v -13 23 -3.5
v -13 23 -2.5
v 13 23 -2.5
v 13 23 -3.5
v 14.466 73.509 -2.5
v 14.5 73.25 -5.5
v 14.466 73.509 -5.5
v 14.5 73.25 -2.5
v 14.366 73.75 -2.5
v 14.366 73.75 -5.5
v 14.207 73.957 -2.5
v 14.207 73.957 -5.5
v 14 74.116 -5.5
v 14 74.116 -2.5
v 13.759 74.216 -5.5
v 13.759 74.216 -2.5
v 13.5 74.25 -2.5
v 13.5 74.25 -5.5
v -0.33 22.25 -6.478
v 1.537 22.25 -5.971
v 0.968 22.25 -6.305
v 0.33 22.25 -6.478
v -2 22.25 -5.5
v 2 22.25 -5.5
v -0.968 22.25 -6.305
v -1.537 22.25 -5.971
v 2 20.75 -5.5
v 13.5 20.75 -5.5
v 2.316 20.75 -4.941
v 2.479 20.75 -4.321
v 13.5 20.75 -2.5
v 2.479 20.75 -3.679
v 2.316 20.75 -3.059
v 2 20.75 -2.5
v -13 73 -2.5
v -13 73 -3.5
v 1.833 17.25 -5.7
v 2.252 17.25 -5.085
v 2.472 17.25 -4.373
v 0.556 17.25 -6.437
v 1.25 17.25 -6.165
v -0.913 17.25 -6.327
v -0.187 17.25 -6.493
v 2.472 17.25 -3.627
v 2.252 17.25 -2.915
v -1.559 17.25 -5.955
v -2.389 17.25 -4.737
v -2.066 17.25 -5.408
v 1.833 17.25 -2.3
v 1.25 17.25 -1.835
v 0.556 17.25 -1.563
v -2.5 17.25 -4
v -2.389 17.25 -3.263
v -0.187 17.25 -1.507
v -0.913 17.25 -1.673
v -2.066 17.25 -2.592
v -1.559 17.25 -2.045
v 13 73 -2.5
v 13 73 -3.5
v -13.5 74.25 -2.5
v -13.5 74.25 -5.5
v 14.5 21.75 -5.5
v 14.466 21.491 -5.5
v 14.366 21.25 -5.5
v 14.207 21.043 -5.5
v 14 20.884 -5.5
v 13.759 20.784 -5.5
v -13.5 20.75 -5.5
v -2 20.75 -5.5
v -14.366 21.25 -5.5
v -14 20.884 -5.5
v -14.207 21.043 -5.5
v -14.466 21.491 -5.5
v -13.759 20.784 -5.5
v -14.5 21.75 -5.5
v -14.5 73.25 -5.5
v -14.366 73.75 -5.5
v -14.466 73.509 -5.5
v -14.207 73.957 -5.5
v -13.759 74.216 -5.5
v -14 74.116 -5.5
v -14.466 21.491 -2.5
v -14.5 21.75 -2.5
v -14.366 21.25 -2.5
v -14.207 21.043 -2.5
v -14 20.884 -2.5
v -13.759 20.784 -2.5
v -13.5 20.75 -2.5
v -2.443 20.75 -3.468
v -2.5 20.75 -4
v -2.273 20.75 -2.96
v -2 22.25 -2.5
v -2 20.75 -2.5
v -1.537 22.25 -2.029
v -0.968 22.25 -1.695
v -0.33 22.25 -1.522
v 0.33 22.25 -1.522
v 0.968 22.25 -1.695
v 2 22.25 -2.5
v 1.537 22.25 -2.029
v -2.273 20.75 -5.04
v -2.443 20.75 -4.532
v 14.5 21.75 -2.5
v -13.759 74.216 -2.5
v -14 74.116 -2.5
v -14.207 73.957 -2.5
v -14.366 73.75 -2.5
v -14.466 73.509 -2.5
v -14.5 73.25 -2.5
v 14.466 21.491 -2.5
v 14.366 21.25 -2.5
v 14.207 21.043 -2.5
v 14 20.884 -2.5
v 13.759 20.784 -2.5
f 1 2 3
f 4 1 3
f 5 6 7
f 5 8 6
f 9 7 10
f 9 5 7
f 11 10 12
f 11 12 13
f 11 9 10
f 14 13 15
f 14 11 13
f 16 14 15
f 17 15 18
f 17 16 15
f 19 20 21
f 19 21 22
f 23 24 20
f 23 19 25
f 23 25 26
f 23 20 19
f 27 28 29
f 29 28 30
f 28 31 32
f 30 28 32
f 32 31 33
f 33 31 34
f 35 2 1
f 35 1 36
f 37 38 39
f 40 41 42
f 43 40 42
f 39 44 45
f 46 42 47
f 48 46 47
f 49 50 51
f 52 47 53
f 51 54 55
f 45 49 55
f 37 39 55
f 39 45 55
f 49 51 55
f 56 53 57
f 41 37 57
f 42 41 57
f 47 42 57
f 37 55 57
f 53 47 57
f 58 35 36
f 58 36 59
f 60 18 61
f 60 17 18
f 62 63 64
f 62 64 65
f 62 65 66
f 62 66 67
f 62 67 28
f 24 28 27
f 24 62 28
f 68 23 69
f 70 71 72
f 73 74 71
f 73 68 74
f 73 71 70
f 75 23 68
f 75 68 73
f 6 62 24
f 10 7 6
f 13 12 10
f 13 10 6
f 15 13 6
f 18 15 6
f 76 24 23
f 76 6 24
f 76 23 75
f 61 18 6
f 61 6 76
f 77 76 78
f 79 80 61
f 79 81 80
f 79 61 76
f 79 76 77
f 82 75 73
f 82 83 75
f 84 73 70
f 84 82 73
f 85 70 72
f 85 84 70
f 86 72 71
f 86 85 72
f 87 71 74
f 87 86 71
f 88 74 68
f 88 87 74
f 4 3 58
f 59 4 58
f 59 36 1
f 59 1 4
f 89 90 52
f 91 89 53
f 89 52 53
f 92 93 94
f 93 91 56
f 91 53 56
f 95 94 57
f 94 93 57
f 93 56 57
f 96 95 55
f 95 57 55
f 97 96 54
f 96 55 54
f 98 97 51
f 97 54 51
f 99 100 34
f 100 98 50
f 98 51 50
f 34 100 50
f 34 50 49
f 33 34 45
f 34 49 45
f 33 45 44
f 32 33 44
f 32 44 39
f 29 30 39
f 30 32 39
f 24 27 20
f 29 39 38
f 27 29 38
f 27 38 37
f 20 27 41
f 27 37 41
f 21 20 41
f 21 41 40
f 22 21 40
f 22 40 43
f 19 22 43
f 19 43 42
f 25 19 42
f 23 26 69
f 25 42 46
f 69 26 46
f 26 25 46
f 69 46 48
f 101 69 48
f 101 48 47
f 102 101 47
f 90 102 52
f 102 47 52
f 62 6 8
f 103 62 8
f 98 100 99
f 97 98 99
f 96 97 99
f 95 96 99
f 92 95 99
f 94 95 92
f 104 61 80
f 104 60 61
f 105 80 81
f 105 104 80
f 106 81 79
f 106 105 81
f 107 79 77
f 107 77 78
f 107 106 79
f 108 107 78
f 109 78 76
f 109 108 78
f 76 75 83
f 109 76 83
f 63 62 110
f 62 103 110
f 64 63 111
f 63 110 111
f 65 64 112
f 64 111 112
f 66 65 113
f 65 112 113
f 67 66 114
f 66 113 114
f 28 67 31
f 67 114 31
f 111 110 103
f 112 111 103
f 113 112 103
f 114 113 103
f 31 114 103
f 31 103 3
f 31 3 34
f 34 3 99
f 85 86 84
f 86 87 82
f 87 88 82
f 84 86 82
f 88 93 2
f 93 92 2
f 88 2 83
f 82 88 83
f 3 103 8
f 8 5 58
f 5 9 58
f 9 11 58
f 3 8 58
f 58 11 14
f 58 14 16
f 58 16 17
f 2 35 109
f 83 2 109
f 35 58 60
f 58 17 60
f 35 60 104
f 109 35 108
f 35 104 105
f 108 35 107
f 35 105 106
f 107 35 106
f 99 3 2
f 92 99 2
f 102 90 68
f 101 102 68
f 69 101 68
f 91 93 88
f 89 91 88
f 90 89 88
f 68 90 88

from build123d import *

# Parameters (mm, degrees)
SKETCH007_R       = 2.5
PAD006_DEPTH      = 5
SKETCH008_W       = 29
SKETCH008_H       = 3
PAD007_DEPTH      = 52
PAD007_DEPTH_BACK = 1.5
FILLET_R          = 1
SKETCH010_W       = 26
SKETCH010_H       = 50
POCKET001_DEPTH   = 1


with BuildPart() as part:
    # Sketch007 (on Face1 of CopyPad001) → Pad006 (new body)
    with BuildSketch(Plane(origin=(0, 17.25, 0), x_dir=(-1, 0, 0), z_dir=(0, 1, 0))):
        with Locations((0, -4)):
            Circle(SKETCH007_R)
    extrude(amount=PAD006_DEPTH)

    # Sketch008 (on Face3 of Pad006) → Pad007 (join, two sides)
    with BuildSketch(Plane(origin=(0, 22.25, 0), x_dir=(-1, 0, 0), z_dir=(0, 1, 0))) as pad007_sk:
        with Locations((0, -4)):
            Rectangle(SKETCH008_W, SKETCH008_H)
    extrude(amount=PAD007_DEPTH)
    extrude(pad007_sk.sketch, amount=-PAD007_DEPTH_BACK)

    # Fillet
    fillet_edges = [part.edges().sort_by_distance(p)[0] for p in [
        (14.5, 74.25, -4),
        (14.5, 20.75, -4),
        (-14.5, 74.25, -4),
        (-14.5, 20.75, -4),
    ]]
    fillet(fillet_edges, radius=FILLET_R)

    # Sketch010 (on Face5 of Fillet) → Pocket001 (cut)
    with BuildSketch(Plane.XY.offset(-2.5)):
        with Locations((0, 48)):
            Rectangle(SKETCH010_W, SKETCH010_H)
    extrude(amount=-POCKET001_DEPTH, mode=Mode.SUBTRACT)


solid = part.part
